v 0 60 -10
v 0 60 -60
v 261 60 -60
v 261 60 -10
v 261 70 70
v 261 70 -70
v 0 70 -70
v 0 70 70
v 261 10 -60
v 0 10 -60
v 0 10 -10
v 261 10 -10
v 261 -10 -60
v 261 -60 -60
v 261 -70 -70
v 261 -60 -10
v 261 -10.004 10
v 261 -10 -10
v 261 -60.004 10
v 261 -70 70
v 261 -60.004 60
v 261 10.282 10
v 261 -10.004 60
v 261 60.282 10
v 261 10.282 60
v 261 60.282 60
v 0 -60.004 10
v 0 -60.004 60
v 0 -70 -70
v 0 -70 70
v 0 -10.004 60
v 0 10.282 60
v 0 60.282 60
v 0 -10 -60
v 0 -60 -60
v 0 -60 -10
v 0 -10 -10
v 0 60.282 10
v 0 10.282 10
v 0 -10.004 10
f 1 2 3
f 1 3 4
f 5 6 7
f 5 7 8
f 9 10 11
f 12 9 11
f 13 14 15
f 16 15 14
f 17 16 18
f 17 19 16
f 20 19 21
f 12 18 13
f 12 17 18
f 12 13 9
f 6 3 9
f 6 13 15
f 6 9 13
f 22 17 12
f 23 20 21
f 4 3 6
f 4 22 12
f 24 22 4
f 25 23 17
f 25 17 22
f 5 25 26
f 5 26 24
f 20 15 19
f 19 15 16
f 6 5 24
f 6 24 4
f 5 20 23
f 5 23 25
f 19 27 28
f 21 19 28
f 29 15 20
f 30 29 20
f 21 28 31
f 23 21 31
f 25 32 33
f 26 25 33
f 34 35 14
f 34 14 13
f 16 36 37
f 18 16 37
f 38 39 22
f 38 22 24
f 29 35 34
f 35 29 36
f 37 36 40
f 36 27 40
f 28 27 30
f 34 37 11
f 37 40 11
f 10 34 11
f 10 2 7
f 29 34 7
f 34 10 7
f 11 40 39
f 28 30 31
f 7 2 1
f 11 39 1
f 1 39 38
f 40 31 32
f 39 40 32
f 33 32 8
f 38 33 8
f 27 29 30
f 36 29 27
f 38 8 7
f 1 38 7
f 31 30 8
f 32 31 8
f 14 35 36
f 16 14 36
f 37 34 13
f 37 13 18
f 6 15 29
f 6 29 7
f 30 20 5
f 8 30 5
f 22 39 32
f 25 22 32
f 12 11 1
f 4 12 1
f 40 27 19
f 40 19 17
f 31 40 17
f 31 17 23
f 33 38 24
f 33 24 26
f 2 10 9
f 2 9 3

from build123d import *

# Parameters (mm, degrees)
SKETCH_W   = 140
SKETCH_H   = 140
SKETCH_W_2 = 50
SKETCH_H_2 = 50
PAD_DEPTH  = 261


with BuildPart() as part:
    # Sketch → Pad (new body)
    with BuildSketch(Plane.YZ):
        Rectangle(SKETCH_W, SKETCH_H)
        with Locations((-35.003519, 35)):
            Rectangle(SKETCH_W_2, SKETCH_H_2, mode=Mode.SUBTRACT)
        with Locations((35.282258, 35)):
            Rectangle(SKETCH_W_2, SKETCH_H_2, mode=Mode.SUBTRACT)
        with Locations((-35, -35)):
            Rectangle(SKETCH_W_2, SKETCH_H_2, mode=Mode.SUBTRACT)
        with Locations((35, -35)):
            Rectangle(SKETCH_W_2, SKETCH_H_2, mode=Mode.SUBTRACT)
    extrude(amount=PAD_DEPTH)


solid = part.part
